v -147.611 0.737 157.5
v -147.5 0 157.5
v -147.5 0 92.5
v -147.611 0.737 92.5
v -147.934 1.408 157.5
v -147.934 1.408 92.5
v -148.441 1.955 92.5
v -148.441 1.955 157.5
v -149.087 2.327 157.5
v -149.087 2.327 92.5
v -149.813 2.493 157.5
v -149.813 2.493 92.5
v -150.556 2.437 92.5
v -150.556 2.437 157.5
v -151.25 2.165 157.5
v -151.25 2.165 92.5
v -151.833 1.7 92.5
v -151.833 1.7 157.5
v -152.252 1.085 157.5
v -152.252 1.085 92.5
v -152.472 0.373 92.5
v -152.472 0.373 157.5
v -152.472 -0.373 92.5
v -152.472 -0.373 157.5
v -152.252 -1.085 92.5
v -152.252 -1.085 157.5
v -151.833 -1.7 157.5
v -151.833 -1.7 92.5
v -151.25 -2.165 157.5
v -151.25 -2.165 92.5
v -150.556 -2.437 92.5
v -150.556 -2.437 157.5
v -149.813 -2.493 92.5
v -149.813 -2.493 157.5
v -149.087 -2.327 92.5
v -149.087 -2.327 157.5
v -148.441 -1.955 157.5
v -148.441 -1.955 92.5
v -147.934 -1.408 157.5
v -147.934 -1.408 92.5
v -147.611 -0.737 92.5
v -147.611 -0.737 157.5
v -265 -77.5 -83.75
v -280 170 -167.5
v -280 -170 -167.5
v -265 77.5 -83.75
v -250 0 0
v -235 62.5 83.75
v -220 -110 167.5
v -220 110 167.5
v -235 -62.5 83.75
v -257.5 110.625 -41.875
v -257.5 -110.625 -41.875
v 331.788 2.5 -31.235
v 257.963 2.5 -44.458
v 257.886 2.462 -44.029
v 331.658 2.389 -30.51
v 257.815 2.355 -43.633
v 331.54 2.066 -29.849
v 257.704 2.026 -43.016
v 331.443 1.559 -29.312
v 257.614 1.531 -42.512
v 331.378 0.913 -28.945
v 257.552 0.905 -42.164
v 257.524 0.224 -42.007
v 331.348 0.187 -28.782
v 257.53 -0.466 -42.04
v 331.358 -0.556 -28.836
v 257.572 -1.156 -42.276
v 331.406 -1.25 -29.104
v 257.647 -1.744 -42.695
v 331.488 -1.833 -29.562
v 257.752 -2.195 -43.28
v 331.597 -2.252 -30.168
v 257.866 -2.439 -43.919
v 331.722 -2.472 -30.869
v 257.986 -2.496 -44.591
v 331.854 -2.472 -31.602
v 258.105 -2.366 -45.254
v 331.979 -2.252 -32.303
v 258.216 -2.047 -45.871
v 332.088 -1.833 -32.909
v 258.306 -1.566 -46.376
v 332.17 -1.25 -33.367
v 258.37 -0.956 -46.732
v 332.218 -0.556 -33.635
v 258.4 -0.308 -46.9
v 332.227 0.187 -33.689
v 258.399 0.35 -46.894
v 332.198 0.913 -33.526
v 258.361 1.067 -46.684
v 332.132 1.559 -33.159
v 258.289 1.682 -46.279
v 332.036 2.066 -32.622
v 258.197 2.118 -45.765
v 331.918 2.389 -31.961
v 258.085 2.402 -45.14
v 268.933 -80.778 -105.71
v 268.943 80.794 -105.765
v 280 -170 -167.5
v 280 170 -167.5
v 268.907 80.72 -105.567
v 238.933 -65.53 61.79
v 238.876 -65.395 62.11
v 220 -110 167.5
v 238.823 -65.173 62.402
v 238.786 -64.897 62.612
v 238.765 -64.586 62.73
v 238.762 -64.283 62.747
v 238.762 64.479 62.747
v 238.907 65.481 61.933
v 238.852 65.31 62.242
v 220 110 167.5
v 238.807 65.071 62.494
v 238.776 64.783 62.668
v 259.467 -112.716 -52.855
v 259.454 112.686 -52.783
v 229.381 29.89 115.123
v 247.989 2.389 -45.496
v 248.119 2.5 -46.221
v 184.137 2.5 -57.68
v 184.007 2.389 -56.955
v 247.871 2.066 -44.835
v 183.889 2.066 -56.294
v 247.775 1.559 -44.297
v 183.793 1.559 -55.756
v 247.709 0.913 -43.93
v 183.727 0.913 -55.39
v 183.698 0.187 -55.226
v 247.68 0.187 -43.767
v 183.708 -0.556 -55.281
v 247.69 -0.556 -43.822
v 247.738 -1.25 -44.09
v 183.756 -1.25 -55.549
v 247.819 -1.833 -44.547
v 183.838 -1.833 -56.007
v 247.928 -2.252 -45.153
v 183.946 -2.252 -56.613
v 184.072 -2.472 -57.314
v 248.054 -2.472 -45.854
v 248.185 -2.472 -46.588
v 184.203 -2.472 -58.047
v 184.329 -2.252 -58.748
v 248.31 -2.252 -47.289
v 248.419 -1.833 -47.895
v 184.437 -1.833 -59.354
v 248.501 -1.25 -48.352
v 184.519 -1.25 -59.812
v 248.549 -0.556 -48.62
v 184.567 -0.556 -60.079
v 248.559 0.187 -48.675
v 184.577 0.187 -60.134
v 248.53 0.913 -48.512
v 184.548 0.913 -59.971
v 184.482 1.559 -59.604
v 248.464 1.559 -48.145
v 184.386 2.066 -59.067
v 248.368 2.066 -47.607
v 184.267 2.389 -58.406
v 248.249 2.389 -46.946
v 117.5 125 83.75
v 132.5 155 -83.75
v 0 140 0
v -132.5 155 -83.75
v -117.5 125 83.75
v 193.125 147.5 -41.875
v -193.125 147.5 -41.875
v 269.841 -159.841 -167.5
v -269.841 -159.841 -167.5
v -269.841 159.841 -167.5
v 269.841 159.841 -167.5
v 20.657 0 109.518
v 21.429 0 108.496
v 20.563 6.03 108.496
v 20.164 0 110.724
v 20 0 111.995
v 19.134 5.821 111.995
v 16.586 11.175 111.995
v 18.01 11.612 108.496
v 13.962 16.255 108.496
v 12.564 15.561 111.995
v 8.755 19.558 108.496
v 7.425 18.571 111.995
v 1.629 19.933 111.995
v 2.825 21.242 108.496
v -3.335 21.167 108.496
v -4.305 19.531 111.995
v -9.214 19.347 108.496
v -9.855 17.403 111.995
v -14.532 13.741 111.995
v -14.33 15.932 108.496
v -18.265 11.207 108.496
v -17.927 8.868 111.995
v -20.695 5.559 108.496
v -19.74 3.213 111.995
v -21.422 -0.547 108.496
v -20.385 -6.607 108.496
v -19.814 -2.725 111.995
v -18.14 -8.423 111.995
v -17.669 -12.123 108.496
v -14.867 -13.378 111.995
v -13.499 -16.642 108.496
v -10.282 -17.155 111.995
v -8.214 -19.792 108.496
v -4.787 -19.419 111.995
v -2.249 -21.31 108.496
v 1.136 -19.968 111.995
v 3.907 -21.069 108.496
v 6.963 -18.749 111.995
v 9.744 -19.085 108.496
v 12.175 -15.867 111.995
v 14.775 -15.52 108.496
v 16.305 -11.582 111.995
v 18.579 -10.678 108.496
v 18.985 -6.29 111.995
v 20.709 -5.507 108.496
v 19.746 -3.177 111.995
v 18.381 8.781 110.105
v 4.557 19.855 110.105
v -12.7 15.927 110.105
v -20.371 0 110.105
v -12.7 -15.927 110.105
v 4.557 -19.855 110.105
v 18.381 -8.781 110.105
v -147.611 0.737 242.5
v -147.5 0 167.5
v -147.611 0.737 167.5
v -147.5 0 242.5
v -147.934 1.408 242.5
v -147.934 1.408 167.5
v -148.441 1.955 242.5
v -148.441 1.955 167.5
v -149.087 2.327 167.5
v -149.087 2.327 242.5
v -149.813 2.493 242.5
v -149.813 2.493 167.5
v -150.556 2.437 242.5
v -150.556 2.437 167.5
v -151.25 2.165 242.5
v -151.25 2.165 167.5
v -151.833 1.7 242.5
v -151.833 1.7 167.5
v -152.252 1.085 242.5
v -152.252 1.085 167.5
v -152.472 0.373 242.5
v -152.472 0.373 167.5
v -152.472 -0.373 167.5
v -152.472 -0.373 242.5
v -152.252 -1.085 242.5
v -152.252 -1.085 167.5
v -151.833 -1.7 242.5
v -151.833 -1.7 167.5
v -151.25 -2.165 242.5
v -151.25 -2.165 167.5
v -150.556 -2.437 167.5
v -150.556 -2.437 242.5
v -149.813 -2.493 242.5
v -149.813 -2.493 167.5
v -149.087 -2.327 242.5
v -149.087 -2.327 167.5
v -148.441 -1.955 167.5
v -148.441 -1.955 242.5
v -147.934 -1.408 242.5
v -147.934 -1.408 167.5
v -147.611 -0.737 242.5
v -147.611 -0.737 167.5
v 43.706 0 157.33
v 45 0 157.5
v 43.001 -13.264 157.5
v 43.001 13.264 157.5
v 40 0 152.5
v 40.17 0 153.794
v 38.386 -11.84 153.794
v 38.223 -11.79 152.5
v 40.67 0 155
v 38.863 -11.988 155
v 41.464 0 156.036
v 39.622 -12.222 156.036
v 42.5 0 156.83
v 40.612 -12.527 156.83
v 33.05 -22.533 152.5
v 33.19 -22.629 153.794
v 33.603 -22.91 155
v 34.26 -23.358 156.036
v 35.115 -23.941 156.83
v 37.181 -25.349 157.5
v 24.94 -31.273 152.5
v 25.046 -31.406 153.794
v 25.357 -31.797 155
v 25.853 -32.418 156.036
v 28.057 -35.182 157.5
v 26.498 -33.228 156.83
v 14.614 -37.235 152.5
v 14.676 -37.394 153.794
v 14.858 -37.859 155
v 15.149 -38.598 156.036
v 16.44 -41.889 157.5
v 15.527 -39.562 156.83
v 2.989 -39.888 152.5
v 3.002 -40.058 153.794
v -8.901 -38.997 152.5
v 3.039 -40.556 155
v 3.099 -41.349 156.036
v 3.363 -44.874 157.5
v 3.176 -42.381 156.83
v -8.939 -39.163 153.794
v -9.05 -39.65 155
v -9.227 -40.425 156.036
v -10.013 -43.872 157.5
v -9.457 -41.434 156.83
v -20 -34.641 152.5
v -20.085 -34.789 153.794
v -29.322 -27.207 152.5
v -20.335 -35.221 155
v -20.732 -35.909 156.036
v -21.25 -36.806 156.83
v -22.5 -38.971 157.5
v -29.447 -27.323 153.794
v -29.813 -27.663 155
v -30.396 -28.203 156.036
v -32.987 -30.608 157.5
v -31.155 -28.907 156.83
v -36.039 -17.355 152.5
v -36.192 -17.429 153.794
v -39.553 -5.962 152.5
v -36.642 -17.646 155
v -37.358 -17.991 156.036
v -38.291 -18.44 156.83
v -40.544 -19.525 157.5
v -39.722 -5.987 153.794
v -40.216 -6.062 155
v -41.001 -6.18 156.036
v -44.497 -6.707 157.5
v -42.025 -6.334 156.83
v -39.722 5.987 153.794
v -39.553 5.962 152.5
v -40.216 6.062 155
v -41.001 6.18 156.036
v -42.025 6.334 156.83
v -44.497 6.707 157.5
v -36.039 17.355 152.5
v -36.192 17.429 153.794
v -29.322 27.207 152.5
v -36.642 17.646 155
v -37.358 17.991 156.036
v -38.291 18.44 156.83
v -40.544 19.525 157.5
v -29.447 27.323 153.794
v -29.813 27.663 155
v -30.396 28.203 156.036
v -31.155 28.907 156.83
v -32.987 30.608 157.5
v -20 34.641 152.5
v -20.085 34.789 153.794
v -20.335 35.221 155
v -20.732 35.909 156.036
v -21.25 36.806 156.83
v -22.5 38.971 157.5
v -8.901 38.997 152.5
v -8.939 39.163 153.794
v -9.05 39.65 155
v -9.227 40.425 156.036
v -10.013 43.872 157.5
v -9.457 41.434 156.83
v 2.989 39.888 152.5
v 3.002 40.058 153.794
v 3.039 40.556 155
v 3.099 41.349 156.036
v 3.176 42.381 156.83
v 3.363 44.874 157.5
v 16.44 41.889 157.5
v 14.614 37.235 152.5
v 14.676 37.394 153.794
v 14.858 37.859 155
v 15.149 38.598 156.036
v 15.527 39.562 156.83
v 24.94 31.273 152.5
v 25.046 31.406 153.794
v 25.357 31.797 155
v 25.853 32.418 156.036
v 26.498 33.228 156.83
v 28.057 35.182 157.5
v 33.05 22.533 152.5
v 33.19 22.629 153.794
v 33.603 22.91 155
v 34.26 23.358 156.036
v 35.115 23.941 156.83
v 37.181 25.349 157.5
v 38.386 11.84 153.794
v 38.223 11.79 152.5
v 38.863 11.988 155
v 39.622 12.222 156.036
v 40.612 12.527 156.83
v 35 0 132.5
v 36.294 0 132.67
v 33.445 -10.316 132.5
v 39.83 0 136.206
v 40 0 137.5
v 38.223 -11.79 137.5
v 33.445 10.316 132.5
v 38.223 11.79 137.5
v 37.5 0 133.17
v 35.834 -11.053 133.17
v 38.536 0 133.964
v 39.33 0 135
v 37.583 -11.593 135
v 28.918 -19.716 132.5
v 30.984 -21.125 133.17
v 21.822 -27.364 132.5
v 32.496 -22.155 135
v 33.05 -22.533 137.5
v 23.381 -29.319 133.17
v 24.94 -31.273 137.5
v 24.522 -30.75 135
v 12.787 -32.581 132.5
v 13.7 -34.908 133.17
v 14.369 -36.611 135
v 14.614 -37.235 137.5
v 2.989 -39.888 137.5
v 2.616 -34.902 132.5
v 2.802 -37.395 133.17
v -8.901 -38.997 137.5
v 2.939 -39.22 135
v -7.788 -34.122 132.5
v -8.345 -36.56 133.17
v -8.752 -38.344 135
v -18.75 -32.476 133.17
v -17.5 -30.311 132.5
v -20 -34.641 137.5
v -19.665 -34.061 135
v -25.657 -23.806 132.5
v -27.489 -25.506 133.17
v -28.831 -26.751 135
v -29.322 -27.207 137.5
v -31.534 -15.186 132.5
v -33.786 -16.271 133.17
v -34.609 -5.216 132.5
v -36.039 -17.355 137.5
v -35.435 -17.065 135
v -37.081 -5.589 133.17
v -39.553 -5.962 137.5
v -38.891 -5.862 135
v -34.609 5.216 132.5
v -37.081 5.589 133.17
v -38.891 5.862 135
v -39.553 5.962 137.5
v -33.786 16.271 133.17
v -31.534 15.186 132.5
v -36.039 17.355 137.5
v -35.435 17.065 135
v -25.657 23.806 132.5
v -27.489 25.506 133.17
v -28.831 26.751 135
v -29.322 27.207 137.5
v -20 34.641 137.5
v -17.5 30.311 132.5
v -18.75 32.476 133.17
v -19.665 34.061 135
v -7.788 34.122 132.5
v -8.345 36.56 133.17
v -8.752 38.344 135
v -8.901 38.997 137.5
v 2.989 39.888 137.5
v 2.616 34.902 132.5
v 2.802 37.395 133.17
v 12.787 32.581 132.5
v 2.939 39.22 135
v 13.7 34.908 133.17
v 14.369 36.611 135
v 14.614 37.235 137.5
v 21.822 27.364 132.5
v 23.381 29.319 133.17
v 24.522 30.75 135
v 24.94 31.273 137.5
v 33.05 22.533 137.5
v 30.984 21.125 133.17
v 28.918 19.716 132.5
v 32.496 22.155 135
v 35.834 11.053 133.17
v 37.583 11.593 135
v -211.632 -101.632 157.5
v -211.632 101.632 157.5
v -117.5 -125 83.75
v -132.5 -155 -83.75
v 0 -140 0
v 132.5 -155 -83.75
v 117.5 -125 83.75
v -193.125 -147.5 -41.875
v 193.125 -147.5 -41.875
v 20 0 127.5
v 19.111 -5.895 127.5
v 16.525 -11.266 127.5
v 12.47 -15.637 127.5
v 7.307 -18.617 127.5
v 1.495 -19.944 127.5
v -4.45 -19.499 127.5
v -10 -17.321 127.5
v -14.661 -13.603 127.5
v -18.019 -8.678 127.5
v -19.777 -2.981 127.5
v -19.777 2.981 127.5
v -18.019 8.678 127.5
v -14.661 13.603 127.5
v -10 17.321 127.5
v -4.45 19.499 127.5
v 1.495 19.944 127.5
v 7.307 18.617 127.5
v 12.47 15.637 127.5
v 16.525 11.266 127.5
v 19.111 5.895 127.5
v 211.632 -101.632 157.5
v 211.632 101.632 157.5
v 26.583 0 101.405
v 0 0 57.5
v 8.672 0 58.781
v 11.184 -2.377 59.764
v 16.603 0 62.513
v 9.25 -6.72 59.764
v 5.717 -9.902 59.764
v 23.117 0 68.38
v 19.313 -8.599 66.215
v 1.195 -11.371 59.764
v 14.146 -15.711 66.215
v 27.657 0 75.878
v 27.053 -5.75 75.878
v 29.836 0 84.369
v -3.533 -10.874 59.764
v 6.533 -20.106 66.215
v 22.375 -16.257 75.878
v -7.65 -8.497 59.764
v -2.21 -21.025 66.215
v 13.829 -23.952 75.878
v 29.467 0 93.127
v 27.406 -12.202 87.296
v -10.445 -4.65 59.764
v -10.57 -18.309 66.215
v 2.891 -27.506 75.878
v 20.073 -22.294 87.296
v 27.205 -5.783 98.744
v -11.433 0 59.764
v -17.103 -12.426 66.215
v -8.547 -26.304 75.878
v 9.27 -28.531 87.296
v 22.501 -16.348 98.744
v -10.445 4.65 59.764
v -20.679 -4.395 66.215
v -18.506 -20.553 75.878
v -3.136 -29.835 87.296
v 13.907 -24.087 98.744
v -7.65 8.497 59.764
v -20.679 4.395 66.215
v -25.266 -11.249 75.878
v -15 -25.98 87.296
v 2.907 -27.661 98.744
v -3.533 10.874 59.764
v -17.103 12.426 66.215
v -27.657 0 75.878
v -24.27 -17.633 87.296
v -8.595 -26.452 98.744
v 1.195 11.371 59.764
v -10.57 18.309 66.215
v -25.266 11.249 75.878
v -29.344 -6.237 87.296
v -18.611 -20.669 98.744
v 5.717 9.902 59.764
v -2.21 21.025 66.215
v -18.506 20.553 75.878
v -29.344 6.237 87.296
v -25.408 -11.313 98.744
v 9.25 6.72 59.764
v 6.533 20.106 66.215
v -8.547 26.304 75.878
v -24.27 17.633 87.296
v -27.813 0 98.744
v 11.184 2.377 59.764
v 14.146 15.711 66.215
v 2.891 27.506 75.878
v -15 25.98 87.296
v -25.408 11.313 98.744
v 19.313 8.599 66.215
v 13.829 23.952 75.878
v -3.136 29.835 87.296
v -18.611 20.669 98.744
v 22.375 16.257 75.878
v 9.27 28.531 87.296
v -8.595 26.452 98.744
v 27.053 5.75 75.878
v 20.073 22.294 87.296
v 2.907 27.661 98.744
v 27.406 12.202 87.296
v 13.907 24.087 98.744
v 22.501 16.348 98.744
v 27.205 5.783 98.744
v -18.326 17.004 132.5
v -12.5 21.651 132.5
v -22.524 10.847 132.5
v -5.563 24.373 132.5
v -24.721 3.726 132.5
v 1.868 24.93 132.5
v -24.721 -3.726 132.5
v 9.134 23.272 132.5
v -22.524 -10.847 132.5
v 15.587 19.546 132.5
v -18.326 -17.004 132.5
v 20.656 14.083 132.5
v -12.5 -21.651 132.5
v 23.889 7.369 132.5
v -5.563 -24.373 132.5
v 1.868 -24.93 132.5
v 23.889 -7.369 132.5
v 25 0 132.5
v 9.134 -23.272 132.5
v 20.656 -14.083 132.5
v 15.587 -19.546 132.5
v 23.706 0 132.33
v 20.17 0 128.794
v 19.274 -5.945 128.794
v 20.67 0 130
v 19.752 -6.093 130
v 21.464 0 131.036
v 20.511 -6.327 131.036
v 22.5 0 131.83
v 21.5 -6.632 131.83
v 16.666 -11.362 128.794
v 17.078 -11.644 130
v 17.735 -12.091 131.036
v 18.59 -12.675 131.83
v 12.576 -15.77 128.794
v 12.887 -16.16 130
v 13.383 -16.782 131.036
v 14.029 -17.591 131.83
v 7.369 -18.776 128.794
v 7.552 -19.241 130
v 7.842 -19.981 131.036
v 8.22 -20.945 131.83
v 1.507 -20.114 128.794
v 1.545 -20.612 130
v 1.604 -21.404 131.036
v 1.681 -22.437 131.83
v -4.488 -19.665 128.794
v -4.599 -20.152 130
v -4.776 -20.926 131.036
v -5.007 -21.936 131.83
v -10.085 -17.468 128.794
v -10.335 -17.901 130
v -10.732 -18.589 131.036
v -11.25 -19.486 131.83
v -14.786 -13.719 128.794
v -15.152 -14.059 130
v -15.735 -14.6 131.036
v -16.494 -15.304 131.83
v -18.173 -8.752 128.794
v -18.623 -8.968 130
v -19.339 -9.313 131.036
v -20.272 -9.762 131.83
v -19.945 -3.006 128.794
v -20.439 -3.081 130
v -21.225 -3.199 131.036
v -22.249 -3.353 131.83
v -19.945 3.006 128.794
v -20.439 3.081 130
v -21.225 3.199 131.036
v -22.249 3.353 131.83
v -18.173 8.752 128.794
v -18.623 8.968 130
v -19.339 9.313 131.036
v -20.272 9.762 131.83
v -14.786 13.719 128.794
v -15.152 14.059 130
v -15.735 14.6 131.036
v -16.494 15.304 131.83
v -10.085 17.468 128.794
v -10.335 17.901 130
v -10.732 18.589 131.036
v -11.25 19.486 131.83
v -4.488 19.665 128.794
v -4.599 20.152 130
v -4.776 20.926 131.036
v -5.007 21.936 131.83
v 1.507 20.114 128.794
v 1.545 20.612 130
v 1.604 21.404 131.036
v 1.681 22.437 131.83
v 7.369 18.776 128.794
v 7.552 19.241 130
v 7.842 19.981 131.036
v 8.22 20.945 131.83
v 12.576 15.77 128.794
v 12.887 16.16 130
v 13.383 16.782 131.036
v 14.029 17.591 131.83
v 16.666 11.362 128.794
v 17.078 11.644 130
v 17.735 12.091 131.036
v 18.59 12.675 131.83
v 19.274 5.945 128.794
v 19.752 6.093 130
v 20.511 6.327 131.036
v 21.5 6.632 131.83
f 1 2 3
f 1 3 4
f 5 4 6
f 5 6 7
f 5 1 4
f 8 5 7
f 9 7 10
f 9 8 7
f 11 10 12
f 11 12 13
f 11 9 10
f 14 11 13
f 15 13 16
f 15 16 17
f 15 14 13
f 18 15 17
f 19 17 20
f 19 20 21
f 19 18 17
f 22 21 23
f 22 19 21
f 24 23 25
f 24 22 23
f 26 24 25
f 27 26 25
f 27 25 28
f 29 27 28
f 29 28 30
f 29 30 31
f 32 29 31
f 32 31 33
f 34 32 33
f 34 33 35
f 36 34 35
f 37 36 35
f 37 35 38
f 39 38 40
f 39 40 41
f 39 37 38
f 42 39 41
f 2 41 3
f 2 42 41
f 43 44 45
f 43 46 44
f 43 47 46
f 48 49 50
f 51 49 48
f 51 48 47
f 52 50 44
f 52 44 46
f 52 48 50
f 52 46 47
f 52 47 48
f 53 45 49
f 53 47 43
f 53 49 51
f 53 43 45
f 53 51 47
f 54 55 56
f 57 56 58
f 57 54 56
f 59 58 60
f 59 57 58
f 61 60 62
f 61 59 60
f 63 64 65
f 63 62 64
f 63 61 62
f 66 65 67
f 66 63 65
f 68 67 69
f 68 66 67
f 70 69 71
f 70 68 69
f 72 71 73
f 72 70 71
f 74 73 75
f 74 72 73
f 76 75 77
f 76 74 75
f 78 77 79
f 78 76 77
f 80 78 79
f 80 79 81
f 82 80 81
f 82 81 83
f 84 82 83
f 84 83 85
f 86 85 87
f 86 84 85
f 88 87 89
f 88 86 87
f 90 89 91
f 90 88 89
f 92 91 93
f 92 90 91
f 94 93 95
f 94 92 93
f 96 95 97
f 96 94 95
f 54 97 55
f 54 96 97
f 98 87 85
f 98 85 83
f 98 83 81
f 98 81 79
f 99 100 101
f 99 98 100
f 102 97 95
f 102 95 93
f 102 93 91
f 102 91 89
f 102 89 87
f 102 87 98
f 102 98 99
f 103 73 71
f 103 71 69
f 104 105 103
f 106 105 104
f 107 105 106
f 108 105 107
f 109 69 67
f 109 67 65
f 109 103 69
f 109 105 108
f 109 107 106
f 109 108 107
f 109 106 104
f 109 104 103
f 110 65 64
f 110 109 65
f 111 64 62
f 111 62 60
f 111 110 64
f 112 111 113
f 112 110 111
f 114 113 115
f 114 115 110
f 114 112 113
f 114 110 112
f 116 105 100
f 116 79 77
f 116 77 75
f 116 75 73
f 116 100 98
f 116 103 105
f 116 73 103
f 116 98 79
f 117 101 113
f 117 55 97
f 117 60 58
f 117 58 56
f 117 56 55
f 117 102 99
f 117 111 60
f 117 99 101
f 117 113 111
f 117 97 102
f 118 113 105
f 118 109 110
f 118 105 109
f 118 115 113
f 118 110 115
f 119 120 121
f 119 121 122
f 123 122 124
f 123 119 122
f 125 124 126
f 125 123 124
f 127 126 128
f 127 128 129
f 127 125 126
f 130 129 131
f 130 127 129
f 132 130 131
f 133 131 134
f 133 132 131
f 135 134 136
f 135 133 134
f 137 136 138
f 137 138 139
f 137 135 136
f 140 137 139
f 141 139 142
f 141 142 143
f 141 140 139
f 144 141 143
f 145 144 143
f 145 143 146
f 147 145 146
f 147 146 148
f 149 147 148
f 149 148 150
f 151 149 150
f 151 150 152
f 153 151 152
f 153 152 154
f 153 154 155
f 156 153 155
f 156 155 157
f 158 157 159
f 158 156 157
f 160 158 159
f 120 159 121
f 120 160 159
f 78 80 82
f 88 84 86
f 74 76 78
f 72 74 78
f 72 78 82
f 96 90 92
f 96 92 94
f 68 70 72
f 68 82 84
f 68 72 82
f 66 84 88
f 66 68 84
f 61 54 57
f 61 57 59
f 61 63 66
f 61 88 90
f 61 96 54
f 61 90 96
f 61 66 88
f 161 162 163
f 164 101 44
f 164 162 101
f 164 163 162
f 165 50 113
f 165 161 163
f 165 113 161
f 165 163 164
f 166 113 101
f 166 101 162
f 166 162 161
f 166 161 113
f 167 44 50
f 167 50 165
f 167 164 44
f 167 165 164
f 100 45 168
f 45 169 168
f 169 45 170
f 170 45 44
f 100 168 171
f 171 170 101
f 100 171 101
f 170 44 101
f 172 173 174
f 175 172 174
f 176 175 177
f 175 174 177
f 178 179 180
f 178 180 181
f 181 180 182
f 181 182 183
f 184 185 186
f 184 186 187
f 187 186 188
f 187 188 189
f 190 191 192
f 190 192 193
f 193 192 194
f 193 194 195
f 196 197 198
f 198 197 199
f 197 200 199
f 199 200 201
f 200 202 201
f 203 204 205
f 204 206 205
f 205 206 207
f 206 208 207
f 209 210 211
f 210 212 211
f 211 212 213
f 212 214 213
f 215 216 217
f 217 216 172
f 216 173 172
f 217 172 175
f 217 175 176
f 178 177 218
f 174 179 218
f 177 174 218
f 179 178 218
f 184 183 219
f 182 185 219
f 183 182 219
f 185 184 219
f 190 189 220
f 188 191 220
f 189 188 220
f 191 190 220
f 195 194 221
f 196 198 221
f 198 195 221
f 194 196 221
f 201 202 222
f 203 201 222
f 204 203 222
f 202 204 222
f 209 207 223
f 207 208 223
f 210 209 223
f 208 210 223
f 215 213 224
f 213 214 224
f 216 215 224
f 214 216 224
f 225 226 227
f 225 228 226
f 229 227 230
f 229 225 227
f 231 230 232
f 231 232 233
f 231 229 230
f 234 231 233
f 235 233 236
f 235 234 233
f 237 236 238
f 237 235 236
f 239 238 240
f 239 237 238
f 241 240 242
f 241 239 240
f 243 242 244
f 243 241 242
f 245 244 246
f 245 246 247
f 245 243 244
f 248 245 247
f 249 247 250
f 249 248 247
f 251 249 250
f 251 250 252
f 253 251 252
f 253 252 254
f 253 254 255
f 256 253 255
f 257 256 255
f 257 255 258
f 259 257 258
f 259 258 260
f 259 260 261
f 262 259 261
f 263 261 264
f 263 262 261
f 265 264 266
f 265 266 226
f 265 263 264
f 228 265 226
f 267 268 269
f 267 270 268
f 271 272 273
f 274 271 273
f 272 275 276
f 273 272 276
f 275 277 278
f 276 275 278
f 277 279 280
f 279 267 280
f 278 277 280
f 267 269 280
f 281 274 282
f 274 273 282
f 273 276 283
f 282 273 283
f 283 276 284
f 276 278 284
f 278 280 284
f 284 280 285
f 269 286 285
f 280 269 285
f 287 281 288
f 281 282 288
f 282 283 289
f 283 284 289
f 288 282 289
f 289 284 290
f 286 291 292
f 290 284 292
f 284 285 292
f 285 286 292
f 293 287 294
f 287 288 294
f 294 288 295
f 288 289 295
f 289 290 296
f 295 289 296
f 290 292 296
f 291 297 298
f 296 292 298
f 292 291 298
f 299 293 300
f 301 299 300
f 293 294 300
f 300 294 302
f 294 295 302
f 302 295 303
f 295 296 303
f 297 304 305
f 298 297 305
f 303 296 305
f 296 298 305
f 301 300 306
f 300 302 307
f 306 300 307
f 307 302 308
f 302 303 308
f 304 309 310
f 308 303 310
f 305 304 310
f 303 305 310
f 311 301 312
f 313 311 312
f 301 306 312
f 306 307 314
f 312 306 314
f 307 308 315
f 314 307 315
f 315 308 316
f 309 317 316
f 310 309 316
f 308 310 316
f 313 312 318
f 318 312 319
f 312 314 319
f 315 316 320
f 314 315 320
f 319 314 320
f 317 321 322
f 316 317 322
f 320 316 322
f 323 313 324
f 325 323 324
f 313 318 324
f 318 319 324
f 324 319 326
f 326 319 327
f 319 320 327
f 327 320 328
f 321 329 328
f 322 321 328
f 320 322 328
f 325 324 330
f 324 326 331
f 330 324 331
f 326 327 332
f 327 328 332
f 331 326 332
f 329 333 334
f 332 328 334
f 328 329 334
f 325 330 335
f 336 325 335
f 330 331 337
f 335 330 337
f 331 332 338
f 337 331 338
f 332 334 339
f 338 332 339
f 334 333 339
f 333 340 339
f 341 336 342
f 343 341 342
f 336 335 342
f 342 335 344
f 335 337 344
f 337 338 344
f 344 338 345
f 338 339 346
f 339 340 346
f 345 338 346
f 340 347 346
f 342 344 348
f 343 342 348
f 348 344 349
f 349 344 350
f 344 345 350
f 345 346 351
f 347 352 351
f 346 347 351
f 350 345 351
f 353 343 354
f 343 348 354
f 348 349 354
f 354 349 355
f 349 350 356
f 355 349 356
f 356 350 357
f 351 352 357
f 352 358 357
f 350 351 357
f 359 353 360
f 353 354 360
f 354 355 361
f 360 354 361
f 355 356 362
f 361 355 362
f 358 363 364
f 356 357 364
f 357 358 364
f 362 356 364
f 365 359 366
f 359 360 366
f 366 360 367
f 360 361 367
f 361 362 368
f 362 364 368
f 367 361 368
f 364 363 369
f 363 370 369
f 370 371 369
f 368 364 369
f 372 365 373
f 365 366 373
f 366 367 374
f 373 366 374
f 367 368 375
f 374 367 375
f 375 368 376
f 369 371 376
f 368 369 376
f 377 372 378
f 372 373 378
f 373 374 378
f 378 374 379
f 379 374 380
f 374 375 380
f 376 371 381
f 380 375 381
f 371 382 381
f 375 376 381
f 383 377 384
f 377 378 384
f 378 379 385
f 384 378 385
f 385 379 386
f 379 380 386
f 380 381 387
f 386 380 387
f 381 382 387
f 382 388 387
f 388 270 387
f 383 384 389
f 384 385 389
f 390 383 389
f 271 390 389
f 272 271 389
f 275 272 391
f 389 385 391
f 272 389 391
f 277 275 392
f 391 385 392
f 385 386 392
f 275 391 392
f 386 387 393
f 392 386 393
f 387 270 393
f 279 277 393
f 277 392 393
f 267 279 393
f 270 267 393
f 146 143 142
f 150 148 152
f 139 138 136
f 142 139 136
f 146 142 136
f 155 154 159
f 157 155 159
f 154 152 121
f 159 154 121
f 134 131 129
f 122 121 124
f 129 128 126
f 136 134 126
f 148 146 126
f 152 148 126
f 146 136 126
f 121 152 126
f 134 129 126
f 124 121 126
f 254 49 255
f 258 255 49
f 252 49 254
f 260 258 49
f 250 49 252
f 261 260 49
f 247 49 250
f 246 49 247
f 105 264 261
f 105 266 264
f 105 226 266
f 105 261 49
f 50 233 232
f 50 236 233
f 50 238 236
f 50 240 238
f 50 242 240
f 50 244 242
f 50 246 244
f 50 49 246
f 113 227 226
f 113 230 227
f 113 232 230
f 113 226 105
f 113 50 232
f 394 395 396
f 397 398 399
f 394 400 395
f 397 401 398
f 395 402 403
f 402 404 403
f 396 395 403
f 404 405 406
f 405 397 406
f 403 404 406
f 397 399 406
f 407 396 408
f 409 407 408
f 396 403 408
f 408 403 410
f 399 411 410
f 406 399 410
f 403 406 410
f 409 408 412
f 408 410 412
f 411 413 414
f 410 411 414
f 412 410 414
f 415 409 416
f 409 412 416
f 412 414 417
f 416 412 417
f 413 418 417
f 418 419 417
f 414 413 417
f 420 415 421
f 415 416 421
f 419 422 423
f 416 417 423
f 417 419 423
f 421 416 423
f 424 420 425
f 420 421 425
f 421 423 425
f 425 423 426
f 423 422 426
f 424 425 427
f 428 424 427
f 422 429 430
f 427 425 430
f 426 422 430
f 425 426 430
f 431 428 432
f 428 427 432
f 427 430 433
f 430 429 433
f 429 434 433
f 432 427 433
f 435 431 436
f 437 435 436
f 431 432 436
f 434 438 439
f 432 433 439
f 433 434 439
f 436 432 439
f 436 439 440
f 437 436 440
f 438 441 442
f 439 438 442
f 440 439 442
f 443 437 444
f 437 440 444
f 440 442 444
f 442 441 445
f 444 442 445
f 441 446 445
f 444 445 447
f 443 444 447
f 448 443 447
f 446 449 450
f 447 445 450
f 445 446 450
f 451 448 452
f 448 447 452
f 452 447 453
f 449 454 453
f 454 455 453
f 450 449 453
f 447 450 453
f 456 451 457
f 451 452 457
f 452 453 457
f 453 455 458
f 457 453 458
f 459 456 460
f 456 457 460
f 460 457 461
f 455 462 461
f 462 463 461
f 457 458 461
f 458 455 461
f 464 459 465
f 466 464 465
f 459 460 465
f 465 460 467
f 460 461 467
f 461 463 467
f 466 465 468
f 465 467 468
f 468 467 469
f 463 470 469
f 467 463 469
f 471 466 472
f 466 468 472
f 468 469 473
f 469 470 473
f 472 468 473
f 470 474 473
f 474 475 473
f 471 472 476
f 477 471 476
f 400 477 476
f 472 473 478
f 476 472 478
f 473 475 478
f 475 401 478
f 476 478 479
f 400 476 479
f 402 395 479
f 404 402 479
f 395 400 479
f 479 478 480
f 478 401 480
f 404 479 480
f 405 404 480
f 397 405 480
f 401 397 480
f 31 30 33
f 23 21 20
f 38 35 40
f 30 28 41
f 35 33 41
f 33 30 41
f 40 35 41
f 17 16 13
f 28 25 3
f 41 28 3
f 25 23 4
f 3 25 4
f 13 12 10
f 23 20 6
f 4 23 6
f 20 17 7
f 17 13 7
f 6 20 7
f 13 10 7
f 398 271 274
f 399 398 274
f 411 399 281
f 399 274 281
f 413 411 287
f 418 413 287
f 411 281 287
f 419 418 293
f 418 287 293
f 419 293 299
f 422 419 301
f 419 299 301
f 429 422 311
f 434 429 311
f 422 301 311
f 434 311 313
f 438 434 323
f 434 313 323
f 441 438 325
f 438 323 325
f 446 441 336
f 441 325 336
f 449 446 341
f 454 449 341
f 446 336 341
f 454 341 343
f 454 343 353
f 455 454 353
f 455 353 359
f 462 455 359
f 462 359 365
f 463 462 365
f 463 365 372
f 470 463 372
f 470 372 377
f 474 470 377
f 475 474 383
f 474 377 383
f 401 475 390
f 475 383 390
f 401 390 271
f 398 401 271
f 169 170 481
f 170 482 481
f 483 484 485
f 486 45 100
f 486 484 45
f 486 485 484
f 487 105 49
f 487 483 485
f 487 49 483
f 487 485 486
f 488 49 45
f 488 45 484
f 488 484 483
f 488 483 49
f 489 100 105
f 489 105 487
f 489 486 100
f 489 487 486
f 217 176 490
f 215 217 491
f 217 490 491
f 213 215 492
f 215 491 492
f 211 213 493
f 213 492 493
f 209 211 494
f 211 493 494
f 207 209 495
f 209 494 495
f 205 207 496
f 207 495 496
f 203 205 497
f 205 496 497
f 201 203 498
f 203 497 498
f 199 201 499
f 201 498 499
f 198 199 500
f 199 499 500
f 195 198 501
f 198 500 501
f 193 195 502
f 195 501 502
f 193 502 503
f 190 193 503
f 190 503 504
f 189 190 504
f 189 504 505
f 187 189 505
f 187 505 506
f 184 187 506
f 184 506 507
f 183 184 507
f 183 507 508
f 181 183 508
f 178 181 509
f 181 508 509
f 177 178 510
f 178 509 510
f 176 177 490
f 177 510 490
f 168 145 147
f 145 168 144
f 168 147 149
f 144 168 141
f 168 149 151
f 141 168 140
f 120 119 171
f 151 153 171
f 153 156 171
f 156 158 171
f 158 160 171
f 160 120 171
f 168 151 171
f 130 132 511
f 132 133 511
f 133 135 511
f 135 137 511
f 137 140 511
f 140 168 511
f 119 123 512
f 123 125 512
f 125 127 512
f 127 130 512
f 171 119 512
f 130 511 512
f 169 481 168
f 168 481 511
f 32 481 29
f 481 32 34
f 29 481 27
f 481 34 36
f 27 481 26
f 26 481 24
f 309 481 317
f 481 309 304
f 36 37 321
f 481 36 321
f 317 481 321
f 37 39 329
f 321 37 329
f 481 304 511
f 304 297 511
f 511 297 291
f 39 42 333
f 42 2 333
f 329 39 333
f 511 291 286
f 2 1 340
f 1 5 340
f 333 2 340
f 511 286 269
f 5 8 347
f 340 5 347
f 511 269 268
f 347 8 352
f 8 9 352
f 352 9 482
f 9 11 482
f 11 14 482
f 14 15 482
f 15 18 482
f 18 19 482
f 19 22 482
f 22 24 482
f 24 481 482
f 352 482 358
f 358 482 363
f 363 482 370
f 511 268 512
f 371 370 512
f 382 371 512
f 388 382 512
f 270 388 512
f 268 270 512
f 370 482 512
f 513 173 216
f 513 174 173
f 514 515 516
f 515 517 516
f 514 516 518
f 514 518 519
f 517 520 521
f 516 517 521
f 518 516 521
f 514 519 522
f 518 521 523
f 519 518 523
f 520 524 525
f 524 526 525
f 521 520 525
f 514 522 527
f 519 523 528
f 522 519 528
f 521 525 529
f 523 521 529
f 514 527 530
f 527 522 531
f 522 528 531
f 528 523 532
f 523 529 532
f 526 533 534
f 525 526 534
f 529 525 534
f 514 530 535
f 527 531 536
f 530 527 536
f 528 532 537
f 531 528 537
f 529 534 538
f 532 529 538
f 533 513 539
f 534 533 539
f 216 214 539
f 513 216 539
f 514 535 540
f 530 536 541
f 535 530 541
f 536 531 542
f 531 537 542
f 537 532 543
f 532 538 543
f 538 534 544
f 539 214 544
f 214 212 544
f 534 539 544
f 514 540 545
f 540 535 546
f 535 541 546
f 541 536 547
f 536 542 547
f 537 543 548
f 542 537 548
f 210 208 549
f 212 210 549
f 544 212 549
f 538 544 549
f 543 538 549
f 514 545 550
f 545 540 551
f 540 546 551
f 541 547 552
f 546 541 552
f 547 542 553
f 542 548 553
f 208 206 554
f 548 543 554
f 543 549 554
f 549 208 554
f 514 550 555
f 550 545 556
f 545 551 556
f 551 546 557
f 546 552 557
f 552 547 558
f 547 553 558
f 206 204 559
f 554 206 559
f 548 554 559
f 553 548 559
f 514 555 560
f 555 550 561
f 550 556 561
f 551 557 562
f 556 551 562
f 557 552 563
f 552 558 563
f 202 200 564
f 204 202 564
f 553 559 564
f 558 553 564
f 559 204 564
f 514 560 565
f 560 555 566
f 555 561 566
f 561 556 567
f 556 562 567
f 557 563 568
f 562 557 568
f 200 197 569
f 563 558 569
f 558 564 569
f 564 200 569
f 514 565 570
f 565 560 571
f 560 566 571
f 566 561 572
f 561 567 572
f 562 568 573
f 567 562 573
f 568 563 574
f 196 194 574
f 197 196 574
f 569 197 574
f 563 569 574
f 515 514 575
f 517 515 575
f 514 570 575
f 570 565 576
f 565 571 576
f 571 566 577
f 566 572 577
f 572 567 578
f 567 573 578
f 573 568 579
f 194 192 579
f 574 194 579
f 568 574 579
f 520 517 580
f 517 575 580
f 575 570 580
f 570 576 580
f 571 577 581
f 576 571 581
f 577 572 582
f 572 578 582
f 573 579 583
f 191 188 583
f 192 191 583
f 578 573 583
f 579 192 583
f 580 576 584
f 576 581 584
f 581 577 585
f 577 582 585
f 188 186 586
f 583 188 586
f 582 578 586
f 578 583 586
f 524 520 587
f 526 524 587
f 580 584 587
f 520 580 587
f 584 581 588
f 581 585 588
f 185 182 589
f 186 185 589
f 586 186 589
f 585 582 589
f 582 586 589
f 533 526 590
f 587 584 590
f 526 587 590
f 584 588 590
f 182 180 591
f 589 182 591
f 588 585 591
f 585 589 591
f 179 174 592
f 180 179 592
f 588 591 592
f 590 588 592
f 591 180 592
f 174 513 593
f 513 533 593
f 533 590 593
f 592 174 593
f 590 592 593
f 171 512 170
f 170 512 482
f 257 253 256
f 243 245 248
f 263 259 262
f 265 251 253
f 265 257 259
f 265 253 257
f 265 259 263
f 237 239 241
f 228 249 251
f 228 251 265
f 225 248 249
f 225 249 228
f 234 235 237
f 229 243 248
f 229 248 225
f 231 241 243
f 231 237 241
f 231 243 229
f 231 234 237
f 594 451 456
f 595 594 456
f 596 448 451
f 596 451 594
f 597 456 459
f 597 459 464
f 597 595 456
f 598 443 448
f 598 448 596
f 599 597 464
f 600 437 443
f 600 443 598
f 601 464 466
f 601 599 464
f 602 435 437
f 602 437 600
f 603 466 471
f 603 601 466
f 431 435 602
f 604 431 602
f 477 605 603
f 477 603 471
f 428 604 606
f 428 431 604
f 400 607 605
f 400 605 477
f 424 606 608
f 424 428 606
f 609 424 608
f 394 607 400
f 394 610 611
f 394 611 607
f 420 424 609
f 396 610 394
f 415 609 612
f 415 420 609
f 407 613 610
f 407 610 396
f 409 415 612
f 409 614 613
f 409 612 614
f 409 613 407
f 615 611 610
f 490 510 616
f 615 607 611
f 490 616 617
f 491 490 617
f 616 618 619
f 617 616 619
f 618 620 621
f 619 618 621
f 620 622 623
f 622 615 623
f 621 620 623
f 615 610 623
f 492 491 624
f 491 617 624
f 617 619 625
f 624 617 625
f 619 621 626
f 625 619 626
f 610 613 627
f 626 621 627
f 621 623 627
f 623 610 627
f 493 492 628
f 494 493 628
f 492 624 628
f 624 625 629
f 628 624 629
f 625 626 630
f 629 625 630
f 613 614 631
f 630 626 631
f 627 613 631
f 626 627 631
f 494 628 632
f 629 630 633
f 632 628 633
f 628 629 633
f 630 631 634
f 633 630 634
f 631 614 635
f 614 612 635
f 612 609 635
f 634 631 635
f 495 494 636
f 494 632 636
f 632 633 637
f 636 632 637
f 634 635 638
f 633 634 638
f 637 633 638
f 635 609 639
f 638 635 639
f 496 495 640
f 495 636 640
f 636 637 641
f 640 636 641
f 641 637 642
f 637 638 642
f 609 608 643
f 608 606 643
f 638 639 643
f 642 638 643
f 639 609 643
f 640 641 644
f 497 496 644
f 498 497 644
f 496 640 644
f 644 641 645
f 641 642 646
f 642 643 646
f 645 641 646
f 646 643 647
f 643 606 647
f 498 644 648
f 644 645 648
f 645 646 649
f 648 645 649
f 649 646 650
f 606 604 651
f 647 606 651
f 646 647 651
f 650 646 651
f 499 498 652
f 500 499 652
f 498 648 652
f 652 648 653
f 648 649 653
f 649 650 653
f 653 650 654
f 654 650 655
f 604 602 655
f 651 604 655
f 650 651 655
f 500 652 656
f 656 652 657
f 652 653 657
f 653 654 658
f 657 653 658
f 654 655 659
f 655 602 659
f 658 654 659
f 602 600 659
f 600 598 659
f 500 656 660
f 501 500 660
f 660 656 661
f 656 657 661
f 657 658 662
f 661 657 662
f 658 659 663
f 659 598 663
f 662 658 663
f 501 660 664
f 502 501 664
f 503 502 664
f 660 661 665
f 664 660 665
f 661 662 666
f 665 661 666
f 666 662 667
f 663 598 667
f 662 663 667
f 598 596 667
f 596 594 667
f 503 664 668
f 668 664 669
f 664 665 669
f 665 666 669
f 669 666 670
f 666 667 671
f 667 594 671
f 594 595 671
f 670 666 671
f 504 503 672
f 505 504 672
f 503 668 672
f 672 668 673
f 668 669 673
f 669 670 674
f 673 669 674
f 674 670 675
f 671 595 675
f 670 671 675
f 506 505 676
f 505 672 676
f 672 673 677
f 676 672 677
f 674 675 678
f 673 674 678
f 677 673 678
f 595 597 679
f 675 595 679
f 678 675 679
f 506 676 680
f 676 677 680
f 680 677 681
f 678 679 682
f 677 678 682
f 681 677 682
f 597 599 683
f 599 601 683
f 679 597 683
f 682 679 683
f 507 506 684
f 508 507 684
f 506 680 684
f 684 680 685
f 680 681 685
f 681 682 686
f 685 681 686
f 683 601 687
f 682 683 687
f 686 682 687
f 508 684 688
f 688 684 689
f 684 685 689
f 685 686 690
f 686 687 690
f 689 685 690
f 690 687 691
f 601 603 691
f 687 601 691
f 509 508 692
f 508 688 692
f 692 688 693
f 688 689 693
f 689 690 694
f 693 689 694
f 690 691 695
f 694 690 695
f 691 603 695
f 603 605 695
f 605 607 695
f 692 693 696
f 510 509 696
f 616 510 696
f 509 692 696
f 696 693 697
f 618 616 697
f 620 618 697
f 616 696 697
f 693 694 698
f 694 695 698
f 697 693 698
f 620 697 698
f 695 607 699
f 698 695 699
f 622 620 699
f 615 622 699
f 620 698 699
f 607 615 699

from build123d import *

# Parameters (mm, degrees)
F3_W      = 560
F3_H      = 340
F2_W      = 440
F2_H      = 220
F5_T      = -10
F8_R      = 40
F9_DEPTH  = 25
F10_R     = 20
F11_DEPTH = 25
F15_R     = 5
F6_R      = 2.5
F16_DEPTH = 75
F7_R      = 2.5
F17_DEPTH = 75


with BuildPart() as f4:
    # F3 (on offset) → F4 section 0
    with BuildSketch(Plane.XY.offset(-167.5)):
        Rectangle(F3_W, F3_H)
    # F2 (on offset) → F4 section 1
    with BuildSketch(Plane.XY.offset(167.5)):
        Rectangle(F2_W, F2_H)
    loft()

    # F5
    f5_openings = [f4.faces().sort_by_distance(p)[0] for p in [
        (0, 0, -167.5),
    ]]
    offset(amount=F5_T, openings=f5_openings)

    # F8 (on face) → F9 (join)
    with BuildSketch(Plane(origin=(0, 0, 157.5), x_dir=(1, 0, 0), z_dir=(0, 0, -1))):
        Circle(F8_R)
    extrude(amount=F9_DEPTH)

    # F10 (on face) → F11 (join)
    with BuildSketch(Plane(origin=(0, 0, 132.5), x_dir=(1, 0, 0), z_dir=(0, 0, -1))):
        Circle(F10_R)
    extrude(amount=F11_DEPTH)

    # F13 (on face) → F14 (revolve)
    with BuildSketch(Plane.XZ):
        with BuildLine():
            Line((0, 117.5), (0, 57.5))
            ThreePointArc((0, 57.5), (30, 87.5), (0, 117.5))
        make_face()
    revolve(axis=Axis((0, 0, 87.5), (0, 0, -1)))

    # F15
    f15_edges = [f4.edges().sort_by_distance(p)[0] for p in [
        (-20, 0, 132.5),
        (-40, 0, 132.5),
        (-20, 0, 109.86068),
        (-40, 0, 157.5),
    ]]
    fillet(f15_edges, radius=F15_R)

    # F6 (on face) → F16 (join, symmetric)
    with BuildSketch(Plane.XY.offset(167.5)):
        with Locations((-150, 0)):
            Circle(F6_R)
    extrude(amount=F16_DEPTH, both=True)

    # F7 (on face) → F17 (join, symmetric)
    with BuildSketch(Plane(origin=(242.2296568098, 0, 43.384416145), x_dir=(0, 1, 0), z_dir=(0.9843366432, 0, 0.1762991003))):
        with Locations((0, -89.2401358232)):
            Circle(F7_R)
    extrude(amount=F17_DEPTH, both=True)


solid = f4.part
